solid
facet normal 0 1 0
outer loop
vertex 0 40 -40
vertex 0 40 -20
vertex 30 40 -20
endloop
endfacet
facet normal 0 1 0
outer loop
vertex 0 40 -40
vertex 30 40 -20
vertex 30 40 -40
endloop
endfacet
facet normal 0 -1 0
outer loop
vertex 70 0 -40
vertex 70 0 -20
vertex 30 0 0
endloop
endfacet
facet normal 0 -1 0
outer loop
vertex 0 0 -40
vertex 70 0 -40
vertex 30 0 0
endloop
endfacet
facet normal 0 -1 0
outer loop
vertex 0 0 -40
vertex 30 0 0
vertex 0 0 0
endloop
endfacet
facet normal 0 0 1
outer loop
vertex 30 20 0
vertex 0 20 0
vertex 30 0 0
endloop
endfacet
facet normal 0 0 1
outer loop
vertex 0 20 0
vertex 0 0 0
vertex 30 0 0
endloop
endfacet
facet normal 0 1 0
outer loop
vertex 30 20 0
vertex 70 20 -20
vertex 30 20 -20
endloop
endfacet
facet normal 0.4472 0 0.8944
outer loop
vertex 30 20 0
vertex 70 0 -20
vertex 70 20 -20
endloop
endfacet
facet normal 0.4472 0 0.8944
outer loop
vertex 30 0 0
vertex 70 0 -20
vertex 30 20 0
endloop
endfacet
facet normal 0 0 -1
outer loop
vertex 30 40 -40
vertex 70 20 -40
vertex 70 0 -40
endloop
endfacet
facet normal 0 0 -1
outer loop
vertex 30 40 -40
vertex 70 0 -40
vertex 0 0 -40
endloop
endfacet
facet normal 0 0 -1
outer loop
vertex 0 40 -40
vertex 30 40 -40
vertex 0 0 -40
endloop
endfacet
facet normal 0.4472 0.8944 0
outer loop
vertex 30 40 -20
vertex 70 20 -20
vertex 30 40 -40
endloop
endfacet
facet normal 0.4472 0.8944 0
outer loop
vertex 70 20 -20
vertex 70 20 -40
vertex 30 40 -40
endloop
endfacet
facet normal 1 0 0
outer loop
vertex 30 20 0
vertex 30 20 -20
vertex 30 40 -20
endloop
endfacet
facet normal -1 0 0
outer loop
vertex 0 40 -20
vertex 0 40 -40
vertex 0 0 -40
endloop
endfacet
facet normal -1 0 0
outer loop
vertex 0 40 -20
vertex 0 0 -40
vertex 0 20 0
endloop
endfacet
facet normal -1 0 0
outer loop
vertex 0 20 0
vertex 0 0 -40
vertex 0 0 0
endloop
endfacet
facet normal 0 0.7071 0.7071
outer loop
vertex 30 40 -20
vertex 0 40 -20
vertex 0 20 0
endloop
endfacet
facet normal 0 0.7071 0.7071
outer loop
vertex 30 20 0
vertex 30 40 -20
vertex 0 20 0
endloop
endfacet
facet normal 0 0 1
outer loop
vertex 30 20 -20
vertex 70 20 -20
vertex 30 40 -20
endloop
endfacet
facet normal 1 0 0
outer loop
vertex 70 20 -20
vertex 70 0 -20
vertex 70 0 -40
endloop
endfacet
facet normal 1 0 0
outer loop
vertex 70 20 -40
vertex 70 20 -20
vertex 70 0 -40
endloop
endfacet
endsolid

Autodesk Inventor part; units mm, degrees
ref_plane "YZ Plane" through (0, 0, 0) normal (1, 0, 0) x (0, 1, 0)
ref_plane "XZ Plane" through (0, 0, 0) normal (0, 1, 0) x (-1, 0, 0)
ref_plane "XY Plane" through (0, 0, 0) normal (0, 0, 1) x (1, 0, 0)
sketch "草圖1" plane through (0, 0, 0) normal (0, 1, 0) x (-1, 0, 0)
  line L0 (0, 0) -> (-30, 0)
  line L1 (-30, 0) -> (-30, -20)
  line L2 (-30, -20) -> (0, -20)
  line L3 (0, -20) -> (0, 0)
  line L4 (0, -20) -> (-70, -20)
  line L5 (-70, -20) -> (-70, -40)
  line L6 (-70, -40) -> (0, -40)
  line L7 (0, -40) -> (0, -20)
  line L8 (-70, -20) -> (-30, 0)
  dimension "d0" = 70
  dimension "d1" = 20
  dimension "d2" = 20
  dimension "d3" = 30
extrude "擠出1" add sketch "草圖1" along normal blind 20
sketch "草圖2" plane through (0, 0, -40) normal (-1, 0, 0) x (0, 0, 1)
  line L0 (0, 0) -> (0, 20) projected
  line L1 (0, 20) -> (20, 20)
  line L2 (20, 20) -> (20, 40)
  line L3 (20, 40) -> (0, 40)
  line L4 (0, 40) -> (0, 20)
  line L5 (20, 40) -> (40, 20)
  line L6 (40, 20) -> (20, 20)
  line L7 (40, 20) -> (20, 20) projected
  point P0 (40, 0)
  dimension "d6" = 20
  dimension "d7" = 20
extrude "擠出2" add sketch "草圖2" against normal blind 30
sketch "草圖3" plane through (70, 0, -40) normal (0, 0, -1) x (-1, 0, 0)
  line L0 (40, 20) -> (40, 40) projected
  line L1 (0, 20) -> (40, 20) projected
  line L2 (0, 20) -> (40, 40)
  point P0 (70, 0)
extrude "擠出3" add sketch "草圖3" against normal blind 20
properties part number "13"
